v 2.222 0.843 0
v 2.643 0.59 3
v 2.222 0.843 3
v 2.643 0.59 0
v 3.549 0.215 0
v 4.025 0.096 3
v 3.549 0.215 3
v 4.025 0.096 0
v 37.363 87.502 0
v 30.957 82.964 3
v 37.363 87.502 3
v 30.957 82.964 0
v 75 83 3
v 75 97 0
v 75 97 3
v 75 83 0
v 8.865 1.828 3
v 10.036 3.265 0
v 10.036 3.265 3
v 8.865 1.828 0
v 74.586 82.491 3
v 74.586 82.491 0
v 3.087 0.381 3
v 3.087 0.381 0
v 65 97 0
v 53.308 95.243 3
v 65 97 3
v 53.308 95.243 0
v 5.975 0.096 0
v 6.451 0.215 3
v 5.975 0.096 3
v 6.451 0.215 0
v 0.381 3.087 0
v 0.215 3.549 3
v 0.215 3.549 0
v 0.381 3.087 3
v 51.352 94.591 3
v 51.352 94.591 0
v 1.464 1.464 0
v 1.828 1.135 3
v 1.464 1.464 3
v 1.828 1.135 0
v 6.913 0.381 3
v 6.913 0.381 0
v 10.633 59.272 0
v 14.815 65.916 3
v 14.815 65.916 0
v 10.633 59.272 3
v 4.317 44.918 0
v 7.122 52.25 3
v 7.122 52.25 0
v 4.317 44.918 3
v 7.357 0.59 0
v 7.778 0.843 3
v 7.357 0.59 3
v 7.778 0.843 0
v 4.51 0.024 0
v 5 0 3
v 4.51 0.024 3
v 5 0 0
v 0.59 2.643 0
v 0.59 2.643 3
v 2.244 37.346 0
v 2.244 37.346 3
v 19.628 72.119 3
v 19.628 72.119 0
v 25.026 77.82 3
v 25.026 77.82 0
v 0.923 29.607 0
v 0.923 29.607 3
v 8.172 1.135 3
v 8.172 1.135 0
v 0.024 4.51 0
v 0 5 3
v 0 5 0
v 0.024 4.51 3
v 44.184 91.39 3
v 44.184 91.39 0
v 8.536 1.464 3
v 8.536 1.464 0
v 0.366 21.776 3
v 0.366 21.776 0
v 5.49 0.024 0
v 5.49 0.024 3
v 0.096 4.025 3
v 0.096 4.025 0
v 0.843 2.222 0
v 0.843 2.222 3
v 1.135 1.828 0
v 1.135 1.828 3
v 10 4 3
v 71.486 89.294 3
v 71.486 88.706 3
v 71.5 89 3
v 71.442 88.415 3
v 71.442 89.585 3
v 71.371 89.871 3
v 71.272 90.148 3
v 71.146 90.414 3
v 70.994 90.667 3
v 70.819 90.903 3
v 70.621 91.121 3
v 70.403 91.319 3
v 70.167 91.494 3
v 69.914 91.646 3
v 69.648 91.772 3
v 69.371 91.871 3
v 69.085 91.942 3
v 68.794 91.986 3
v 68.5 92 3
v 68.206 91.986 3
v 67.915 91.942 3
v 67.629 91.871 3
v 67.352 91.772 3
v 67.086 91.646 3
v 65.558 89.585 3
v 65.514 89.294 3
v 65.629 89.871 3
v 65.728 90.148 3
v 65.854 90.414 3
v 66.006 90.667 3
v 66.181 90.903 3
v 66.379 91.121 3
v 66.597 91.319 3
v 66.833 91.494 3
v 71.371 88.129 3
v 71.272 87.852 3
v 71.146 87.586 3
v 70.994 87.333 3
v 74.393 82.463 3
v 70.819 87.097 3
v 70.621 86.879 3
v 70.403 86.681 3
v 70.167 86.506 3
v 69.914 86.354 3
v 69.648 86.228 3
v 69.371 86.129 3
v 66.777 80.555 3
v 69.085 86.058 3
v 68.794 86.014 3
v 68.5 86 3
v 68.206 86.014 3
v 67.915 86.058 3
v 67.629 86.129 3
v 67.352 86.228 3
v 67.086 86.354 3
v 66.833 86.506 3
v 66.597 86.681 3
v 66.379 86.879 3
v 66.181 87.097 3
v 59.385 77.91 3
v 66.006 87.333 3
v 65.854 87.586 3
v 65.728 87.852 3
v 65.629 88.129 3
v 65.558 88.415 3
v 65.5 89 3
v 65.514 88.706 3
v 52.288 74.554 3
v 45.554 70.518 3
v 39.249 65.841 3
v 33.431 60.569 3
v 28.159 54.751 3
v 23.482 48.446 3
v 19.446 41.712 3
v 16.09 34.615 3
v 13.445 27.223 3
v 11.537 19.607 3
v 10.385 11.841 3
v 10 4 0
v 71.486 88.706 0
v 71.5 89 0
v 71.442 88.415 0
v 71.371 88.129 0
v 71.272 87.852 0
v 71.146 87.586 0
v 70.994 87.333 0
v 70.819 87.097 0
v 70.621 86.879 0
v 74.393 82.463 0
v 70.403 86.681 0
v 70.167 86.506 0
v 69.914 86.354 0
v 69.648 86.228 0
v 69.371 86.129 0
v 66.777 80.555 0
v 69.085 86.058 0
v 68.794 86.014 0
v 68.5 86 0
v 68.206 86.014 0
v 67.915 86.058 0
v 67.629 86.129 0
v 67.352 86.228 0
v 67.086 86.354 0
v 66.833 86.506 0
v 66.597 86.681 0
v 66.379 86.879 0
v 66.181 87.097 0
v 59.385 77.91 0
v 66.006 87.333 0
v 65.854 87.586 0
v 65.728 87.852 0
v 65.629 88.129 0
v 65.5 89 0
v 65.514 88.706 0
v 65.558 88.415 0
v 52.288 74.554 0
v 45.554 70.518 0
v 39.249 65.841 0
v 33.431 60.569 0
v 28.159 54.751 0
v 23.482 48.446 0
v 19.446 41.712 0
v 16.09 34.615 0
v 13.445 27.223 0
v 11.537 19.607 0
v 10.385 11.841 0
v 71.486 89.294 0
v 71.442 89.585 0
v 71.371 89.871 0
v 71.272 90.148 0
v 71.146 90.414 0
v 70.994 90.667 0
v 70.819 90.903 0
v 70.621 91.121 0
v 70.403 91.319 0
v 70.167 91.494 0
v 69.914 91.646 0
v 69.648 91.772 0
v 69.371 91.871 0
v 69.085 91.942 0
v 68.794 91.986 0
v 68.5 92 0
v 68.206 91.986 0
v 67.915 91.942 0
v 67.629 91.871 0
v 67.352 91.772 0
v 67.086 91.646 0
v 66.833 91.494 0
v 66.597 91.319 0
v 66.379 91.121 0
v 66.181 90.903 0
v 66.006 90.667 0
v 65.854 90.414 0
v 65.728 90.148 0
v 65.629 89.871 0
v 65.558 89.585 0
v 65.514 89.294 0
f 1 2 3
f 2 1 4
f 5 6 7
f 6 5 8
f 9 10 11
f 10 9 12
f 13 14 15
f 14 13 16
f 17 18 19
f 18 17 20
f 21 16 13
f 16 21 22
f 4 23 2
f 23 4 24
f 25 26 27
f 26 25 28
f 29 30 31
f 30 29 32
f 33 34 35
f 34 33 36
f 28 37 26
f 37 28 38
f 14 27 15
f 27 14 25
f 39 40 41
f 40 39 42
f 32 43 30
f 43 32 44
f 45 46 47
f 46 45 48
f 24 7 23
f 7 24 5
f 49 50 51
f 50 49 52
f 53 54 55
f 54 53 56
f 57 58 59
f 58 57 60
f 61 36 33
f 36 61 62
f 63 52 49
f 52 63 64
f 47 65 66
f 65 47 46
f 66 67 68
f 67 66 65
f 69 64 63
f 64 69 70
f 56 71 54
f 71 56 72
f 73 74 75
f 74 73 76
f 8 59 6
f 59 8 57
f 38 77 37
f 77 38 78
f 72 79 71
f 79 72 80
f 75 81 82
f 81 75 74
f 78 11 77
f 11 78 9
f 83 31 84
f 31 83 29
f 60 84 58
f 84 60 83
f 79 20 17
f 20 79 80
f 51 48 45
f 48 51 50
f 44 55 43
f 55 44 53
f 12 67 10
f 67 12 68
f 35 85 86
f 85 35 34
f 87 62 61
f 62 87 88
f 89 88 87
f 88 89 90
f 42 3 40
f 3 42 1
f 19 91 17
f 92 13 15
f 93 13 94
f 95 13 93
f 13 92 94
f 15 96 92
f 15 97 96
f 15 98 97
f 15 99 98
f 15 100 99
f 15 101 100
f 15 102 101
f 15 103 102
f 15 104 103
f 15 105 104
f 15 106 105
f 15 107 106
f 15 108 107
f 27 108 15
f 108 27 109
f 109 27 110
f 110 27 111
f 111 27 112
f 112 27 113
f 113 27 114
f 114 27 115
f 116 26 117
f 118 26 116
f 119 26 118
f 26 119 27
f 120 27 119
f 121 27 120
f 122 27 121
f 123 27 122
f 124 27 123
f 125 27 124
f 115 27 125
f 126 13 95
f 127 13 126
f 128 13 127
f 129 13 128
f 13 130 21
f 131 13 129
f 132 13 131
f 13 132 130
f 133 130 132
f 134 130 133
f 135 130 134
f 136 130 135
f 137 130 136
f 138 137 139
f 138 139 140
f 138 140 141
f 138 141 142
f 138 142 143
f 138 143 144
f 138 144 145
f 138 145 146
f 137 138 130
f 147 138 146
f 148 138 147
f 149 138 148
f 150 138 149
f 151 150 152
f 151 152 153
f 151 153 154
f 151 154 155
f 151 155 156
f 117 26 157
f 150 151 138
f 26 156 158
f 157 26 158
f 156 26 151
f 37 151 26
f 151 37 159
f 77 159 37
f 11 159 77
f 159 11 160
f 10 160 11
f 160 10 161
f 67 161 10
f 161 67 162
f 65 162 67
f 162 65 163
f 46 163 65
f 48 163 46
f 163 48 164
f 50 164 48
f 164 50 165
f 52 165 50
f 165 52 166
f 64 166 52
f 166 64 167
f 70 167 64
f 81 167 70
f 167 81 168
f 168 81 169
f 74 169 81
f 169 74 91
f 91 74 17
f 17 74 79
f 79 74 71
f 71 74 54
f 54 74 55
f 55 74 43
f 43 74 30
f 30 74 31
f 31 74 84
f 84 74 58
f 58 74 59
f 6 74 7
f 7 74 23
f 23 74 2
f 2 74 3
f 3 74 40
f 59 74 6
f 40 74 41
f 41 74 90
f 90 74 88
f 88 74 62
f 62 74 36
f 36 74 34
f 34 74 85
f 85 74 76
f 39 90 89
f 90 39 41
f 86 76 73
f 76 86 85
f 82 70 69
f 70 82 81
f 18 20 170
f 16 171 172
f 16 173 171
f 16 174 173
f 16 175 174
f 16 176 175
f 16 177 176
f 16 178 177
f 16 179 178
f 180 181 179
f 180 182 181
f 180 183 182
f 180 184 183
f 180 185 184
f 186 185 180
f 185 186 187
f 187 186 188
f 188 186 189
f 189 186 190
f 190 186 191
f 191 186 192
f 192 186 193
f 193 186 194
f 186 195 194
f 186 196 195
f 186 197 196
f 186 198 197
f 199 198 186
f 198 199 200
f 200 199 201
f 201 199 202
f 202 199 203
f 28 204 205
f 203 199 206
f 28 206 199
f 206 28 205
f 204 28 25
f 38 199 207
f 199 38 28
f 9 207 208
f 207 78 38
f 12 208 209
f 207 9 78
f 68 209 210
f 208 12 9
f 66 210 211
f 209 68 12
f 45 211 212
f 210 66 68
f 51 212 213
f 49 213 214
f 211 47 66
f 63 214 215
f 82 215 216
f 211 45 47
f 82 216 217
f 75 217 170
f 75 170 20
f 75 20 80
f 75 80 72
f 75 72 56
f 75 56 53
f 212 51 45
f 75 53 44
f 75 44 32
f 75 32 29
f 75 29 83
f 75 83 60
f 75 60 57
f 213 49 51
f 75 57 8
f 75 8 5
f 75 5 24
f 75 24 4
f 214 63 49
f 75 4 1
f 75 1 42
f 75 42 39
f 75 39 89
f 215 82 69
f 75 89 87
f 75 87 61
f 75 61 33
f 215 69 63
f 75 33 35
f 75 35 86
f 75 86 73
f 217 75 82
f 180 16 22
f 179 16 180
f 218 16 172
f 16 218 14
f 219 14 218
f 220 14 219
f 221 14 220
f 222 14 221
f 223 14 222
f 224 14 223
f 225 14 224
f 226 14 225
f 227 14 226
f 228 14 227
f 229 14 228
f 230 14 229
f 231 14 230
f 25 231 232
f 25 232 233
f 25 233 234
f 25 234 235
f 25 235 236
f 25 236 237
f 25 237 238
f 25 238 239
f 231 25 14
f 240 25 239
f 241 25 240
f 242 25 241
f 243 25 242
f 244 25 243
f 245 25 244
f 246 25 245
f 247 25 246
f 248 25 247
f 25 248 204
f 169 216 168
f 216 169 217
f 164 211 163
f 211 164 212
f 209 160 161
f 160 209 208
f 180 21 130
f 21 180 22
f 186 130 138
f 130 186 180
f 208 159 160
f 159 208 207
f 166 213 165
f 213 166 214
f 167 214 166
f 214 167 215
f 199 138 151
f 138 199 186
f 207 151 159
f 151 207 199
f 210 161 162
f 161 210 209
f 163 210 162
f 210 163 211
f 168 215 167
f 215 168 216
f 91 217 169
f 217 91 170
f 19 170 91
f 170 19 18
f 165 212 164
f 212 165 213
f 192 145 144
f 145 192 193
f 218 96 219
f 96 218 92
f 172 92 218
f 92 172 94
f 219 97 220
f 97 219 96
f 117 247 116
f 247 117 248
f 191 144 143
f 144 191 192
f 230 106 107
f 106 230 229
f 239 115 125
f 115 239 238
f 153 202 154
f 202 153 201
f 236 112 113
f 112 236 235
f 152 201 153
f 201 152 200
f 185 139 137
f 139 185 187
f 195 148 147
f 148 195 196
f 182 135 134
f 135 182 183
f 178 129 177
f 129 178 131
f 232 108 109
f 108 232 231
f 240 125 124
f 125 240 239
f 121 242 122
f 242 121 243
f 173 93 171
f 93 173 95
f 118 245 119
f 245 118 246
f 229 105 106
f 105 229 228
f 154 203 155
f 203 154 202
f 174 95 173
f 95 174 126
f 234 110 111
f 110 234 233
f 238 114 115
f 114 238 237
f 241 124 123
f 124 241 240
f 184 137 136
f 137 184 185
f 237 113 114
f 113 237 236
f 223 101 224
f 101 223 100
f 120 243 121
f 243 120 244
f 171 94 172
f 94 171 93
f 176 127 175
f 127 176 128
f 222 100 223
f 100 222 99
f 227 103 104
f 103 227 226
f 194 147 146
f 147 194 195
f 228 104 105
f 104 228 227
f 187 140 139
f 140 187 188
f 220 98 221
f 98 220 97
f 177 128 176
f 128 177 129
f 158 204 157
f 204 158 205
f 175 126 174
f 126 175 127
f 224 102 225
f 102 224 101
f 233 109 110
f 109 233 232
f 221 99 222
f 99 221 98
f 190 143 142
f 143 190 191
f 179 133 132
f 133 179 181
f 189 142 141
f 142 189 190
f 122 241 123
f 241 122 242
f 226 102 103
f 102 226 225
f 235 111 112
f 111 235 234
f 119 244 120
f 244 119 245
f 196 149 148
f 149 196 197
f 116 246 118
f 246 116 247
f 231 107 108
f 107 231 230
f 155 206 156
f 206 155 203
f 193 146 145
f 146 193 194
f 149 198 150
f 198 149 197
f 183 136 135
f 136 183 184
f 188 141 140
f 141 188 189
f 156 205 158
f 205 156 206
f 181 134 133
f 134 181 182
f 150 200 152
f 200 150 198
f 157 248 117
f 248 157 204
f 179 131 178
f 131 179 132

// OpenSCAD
// hub is radius of 27, centered on 0,0,xy plane
// get license and attribute or replace with self
// design

$fn=64;
module basic_fin() {
    translate([75,0,0]) {
        rotate([0,180,0]) {
            import("fin2.stl", convexity=3);
        }
    }
}

module curve1() {
    rotate([0,0,-80]) {    
        difference() {
            cylinder(r=55, h=3);
            translate([14,14,-1]) {
                cylinder(r=65, h=5);
            }
        }
    }
}
module curve2() {
    rotate([0,0,-80]) {
        difference() {
            translate([2,0,0]) {
                cylinder(r=80, h=3);
            }
            translate([10,10,-1]) {
                cylinder(r=90, h=5);
            }
        }   
    }
}

module basic_fin_1() {
    difference() {
        hull() {
            translate([65,83,0]) {
                cube([10,14,3]);
            }
            translate([80,22,0]) {
                curve2();
            }
            translate([5,5,0]) {
                cylinder(r=5, h=3);
            }
        }
        translate([90,4,-1]) {
            cylinder(r=80, h=5, $fn=64);
        }
    }
}

module make_model() {
    difference() {

        basic_fin_1();
        translate([68.5,89,-2]) {
            cylinder(r=3, h=25);
        }
        //basic_fin();
    }
    translate([0,85,0]) {
        //cube([75, 5,5]);
    }
}

    $flat_for_svg = 0;

if ($flat_for_svg) {
    projection(cut=true) {
        translate([0,0,0]) rotate([0,0,0]) {
            make_model();
        }
    }
} else {
    make_model();
}
